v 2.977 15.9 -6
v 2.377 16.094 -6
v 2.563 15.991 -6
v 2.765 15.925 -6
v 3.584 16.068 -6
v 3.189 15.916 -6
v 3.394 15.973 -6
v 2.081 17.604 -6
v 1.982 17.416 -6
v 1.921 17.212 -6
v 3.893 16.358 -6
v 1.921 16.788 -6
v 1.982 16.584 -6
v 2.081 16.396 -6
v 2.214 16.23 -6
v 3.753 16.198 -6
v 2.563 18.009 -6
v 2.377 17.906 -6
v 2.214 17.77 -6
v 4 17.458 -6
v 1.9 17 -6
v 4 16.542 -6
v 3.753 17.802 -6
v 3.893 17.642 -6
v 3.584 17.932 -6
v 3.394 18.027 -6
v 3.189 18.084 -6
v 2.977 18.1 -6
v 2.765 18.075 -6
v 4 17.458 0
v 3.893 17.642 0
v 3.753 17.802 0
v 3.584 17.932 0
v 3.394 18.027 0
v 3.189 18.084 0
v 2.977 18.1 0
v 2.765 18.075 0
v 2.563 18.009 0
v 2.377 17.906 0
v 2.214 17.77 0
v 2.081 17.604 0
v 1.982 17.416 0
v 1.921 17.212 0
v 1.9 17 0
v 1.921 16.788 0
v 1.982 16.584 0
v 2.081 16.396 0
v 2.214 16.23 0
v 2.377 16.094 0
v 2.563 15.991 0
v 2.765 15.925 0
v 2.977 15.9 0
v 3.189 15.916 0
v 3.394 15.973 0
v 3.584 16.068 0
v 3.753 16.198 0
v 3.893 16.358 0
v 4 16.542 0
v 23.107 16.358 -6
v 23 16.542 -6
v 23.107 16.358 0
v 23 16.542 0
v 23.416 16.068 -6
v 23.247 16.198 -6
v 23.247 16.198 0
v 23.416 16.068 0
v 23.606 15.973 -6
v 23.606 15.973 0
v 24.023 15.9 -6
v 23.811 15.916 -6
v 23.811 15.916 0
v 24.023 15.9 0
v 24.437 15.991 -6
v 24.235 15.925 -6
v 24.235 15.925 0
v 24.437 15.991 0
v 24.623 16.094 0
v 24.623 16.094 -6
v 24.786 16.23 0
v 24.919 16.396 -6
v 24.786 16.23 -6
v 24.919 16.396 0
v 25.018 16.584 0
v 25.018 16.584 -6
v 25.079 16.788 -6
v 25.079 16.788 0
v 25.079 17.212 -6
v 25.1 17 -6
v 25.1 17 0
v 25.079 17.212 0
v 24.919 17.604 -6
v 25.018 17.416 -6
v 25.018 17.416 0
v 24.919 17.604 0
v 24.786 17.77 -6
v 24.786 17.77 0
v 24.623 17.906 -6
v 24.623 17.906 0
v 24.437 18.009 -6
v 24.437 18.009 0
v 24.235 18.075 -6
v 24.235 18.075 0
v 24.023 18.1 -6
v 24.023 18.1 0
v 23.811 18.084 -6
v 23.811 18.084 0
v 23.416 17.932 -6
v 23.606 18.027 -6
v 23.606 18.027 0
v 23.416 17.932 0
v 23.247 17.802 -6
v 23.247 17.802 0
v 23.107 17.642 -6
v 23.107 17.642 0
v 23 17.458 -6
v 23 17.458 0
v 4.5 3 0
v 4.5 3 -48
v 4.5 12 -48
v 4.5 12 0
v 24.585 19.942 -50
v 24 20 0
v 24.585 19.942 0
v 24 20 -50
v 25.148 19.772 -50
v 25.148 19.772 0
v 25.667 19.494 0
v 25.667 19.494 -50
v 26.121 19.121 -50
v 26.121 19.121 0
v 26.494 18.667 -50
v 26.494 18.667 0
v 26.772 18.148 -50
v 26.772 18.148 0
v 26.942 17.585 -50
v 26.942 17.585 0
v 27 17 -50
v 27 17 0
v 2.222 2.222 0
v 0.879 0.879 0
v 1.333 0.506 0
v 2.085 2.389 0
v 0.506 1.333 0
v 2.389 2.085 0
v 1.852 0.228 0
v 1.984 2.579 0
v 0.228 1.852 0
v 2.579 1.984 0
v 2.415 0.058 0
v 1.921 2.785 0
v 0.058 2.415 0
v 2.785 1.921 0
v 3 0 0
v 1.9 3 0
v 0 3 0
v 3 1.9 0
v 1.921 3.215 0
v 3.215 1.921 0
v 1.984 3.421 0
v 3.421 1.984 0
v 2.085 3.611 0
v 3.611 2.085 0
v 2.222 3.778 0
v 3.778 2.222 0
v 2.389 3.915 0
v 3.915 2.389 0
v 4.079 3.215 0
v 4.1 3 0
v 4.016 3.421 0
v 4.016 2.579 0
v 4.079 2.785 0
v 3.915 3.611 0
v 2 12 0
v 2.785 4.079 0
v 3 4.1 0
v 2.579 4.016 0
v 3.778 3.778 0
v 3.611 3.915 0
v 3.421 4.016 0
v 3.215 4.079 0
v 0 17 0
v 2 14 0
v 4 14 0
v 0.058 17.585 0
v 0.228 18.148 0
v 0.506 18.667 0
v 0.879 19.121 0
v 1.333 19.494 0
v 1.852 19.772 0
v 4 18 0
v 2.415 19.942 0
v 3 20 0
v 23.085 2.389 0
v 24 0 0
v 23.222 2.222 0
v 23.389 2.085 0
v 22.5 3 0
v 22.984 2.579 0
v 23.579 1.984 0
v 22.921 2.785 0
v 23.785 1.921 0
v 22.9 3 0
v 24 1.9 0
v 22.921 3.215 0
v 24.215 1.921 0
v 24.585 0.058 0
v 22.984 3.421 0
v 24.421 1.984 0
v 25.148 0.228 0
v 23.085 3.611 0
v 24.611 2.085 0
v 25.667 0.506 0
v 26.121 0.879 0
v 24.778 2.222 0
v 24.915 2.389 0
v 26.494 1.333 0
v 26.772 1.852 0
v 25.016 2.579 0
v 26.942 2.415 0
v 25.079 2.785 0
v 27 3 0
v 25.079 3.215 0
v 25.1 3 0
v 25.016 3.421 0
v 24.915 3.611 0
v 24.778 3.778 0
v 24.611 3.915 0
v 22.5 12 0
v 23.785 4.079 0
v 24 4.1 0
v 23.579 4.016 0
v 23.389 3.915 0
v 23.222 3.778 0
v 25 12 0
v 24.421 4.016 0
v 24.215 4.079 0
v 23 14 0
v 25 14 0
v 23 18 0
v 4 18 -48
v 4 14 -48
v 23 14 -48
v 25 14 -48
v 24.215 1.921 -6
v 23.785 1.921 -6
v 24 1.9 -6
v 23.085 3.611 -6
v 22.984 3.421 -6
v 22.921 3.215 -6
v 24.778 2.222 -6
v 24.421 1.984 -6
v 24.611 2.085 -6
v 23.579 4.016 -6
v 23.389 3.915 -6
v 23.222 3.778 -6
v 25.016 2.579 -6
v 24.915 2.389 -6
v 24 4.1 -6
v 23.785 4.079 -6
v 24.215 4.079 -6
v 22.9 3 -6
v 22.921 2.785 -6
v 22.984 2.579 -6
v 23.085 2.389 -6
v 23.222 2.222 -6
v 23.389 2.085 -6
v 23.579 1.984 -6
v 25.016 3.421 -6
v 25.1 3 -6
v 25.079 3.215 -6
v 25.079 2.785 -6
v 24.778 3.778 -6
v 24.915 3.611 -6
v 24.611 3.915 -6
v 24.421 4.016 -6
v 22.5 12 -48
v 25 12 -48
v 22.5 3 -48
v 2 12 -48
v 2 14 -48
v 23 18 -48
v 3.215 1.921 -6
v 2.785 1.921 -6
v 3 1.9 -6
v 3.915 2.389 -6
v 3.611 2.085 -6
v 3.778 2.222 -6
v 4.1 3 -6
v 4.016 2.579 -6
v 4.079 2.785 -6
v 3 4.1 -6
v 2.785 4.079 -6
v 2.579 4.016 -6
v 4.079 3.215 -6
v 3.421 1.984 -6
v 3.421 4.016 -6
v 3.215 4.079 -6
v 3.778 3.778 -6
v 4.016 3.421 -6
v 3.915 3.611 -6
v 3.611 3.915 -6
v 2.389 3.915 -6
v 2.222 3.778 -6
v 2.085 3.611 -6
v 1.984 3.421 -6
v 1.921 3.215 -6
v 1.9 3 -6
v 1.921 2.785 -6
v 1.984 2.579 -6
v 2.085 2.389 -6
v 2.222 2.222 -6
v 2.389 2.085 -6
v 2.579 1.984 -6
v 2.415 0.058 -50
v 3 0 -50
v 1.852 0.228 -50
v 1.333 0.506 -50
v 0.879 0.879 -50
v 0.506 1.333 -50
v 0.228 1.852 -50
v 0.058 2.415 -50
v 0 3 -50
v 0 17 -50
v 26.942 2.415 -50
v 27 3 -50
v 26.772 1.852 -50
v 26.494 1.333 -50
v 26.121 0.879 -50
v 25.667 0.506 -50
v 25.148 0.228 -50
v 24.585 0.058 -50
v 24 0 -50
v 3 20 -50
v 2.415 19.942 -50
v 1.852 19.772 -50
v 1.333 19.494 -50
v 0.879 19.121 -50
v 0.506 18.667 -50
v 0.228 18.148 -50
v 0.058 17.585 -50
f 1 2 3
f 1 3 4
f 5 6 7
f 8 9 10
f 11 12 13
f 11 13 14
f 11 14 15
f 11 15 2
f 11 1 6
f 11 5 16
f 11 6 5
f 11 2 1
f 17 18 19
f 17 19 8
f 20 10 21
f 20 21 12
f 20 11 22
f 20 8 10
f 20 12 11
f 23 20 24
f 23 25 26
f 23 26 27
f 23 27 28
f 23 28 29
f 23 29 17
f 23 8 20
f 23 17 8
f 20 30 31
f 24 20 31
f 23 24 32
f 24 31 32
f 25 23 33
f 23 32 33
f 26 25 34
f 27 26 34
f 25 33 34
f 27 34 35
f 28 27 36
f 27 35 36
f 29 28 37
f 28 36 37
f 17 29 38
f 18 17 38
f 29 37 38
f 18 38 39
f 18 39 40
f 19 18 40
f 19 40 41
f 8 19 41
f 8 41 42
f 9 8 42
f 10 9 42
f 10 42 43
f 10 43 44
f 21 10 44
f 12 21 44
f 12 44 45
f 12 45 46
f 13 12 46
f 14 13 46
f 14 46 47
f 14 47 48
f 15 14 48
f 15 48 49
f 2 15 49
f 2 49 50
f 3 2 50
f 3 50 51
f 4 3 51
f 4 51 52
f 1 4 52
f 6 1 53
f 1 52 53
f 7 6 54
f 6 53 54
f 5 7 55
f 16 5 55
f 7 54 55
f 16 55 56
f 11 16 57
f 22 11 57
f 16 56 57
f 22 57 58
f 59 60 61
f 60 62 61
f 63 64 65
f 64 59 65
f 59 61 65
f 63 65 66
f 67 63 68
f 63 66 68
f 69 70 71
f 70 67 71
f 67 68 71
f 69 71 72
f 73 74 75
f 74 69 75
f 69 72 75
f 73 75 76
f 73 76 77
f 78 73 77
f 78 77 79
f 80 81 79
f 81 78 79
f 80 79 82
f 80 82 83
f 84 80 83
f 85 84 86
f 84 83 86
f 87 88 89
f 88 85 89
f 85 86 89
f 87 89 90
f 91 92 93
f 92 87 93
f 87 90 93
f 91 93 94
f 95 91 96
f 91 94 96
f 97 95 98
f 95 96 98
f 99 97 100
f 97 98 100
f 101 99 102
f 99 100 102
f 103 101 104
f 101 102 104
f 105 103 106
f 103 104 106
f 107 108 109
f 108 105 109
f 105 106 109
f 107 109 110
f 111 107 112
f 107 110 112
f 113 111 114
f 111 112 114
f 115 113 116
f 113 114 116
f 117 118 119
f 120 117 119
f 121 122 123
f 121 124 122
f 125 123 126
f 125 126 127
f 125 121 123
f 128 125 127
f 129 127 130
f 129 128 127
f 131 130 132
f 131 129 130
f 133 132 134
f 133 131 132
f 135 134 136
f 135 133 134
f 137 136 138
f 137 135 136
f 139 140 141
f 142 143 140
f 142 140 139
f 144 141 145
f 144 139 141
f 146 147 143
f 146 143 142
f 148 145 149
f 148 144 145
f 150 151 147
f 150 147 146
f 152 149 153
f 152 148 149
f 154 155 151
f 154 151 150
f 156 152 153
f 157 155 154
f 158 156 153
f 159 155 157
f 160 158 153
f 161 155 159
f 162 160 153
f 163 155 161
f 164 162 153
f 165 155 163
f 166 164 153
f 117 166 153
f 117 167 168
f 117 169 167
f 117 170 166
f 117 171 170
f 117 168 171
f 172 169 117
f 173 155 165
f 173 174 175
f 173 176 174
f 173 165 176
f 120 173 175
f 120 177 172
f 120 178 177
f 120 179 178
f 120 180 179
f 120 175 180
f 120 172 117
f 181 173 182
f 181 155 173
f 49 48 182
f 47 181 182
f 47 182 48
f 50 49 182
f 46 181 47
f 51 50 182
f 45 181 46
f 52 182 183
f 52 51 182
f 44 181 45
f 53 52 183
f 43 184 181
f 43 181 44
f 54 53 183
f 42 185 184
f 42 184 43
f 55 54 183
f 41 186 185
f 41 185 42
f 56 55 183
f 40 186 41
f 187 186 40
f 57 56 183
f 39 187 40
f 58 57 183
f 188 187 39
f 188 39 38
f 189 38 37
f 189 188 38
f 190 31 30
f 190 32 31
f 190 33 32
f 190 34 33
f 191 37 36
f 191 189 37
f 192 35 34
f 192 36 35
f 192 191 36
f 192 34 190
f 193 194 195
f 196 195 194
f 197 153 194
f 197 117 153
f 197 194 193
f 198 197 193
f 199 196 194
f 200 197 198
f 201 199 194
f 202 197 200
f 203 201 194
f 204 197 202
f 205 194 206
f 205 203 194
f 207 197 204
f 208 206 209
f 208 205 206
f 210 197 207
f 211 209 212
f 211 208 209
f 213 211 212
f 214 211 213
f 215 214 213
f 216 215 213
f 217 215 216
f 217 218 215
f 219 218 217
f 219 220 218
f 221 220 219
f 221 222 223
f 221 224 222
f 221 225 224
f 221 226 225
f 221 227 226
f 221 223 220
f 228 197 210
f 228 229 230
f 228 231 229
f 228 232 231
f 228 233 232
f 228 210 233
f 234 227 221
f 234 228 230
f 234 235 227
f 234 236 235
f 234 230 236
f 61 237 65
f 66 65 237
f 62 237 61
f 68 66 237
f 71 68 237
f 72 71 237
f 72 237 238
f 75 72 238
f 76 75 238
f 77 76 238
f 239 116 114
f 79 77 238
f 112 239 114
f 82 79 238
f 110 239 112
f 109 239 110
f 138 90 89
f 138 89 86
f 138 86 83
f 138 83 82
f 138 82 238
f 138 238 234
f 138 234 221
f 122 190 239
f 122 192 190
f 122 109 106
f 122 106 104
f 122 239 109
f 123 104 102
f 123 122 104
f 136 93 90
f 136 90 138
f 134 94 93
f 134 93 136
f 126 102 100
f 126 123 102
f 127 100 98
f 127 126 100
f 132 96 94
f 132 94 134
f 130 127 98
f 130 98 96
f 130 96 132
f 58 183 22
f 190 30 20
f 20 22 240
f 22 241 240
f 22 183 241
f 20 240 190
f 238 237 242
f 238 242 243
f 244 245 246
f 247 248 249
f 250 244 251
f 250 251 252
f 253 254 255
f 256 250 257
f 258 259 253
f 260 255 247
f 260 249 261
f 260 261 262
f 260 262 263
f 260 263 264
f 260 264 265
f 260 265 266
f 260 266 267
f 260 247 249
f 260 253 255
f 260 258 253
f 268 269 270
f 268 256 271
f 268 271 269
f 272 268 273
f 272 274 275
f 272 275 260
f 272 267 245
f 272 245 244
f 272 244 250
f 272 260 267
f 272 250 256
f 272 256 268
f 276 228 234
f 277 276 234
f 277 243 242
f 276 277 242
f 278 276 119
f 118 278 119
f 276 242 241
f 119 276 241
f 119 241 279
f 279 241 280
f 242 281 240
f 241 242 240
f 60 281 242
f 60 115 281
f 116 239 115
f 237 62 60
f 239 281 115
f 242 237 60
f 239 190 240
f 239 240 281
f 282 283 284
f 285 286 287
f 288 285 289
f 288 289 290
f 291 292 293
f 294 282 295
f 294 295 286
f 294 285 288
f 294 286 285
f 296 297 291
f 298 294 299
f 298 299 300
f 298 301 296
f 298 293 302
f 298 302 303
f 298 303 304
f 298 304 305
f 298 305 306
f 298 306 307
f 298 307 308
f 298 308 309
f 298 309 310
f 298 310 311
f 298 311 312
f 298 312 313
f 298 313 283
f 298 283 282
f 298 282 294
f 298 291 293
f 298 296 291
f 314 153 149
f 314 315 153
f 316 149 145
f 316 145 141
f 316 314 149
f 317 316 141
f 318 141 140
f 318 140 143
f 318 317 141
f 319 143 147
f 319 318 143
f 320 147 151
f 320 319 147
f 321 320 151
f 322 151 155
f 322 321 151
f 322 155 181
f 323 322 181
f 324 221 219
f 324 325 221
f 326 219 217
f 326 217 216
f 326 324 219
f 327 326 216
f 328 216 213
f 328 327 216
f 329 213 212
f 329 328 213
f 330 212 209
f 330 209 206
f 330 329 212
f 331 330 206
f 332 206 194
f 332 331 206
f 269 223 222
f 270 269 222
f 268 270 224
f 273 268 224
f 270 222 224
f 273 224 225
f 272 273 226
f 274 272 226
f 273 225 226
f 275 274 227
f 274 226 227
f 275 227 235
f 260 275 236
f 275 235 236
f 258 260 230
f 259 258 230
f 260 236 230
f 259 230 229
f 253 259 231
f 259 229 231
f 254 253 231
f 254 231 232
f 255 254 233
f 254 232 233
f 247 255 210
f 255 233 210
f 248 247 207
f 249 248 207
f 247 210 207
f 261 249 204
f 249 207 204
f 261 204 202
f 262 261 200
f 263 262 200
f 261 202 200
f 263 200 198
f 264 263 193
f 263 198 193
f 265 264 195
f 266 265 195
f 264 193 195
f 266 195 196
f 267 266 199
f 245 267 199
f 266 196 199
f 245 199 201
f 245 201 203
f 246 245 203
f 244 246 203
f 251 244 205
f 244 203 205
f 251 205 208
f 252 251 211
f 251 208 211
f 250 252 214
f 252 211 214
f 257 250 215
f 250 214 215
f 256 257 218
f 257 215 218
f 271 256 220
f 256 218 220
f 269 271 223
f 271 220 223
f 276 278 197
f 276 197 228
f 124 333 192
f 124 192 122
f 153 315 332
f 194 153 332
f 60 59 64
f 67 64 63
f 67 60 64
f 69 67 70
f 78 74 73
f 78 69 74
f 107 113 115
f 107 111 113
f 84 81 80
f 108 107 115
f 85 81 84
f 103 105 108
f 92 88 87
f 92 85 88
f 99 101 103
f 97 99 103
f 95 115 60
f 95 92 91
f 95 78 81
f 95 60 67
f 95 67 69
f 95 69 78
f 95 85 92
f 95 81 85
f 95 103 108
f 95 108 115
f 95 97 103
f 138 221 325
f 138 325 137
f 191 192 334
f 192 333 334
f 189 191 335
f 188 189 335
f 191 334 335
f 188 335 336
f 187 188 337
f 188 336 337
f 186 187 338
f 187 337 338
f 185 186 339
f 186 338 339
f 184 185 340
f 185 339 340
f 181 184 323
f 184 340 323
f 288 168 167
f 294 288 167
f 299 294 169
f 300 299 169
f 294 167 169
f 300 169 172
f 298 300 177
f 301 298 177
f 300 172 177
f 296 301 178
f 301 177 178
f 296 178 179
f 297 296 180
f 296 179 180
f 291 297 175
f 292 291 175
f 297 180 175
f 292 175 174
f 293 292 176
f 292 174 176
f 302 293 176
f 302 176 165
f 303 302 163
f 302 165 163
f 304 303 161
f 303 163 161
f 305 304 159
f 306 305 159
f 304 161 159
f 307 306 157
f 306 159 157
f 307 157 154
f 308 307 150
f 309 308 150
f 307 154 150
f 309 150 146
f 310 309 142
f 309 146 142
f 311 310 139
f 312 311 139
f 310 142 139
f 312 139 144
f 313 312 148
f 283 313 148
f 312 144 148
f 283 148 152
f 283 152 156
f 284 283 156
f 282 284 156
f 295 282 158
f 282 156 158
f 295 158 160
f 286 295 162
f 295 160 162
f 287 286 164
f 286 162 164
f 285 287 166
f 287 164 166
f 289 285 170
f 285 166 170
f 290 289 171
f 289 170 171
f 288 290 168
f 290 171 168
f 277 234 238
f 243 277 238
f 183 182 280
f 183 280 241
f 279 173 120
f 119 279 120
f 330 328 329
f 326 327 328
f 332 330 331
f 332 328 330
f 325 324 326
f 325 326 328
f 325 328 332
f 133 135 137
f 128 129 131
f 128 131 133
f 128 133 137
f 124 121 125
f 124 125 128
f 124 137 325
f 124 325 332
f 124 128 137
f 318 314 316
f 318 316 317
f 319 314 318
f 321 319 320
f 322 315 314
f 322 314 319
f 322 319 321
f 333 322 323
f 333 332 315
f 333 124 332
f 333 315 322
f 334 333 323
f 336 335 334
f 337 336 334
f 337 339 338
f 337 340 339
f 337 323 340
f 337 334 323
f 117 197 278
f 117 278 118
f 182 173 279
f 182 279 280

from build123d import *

# Parameters (mm, degrees)
SKETCH1_W               = 27
SKETCH1_H               = 20
BOSS_EXTRUDE1_DEPTH     = 50
SKETCH2_W               = 19
SKETCH2_H               = 14
BOSS_EXTRUDE2_DEPTH     = 2
SKETCH3_W               = 23
SKETCH3_H               = 2
CUT_EXTRUDE1_DEPTH      = 48
SKETCH4_W               = 0.5
SKETCH4_H               = 9
SKETCH4_W_2             = 19
SKETCH4_H_2             = 0.5
BOSS_EXTRUDE3_DEPTH     = 48
FILLET1_R               = 3
SKETCH6_R               = 1.1
CUT_EXTRUDE2_DEPTH      = 6
CUT_EXTRUDE3_DEPTH      = 61.241181927
CUT_EXTRUDE3_DEPTH_BACK = 48
SKETCH14_W              = 19
SKETCH14_H              = 1.5


with BuildPart() as part:
    # Sketch1 → Boss-Extrude1 (new body)
    with BuildSketch(Plane.XY):
        with Locations((13.5, 10)):
            Rectangle(SKETCH1_W, SKETCH1_H)
        Polygon((4, 17), (23, 17), (23, 16), (23, 4), (23, 3), (4, 3), (4, 4), (4, 16), align=None, mode=Mode.SUBTRACT)
    extrude(amount=-BOSS_EXTRUDE1_DEPTH)

    # Sketch2 → Boss-Extrude2 (add)
    with BuildSketch(Plane(origin=(0, 0, -50), x_dir=(-1, 0, 0), z_dir=(0, 0, -1))):
        with Locations((-13.5, 10)):
            Rectangle(SKETCH2_W, SKETCH2_H)
    extrude(amount=-BOSS_EXTRUDE2_DEPTH)

    # Sketch3 → Cut-Extrude1 (cut)
    with BuildSketch(Plane.XY):
        with Locations((13.5, 13)):
            Rectangle(SKETCH3_W, SKETCH3_H)
    extrude(amount=-CUT_EXTRUDE1_DEPTH, mode=Mode.SUBTRACT)

    # Sketch4 → Boss-Extrude3 (add)
    with BuildSketch(Plane.XY):
        with Locations((4.25, 7.5)):
            Rectangle(SKETCH4_W, SKETCH4_H)
        with Locations((22.75, 7.5)):
            Rectangle(SKETCH4_W, SKETCH4_H)
        with Locations((13.5, 16.75)):
            Rectangle(SKETCH4_W_2, SKETCH4_H_2)
    extrude(amount=-BOSS_EXTRUDE3_DEPTH)

    # Fillet1
    fillet1_edges = [part.edges().sort_by_distance(p)[0] for p in [
        (0, 0, -25),
        (0, 20, -25),
        (27, 20, -25),
        (27, 0, -25),
    ]]
    fillet(fillet1_edges, radius=FILLET1_R)

    # Sketch6 → Cut-Extrude2 (cut)
    with BuildSketch(Plane.XY):
        with Locations((3, 17)):
            Circle(SKETCH6_R)
        with Locations((24, 17)):
            Circle(SKETCH6_R)
        with Locations((24, 3)):
            Circle(SKETCH6_R)
        with Locations((3, 3)):
            Circle(SKETCH6_R)
    extrude(amount=-CUT_EXTRUDE2_DEPTH, mode=Mode.SUBTRACT)

    # Sketch14 → Cut-Extrude3 (cut, two sides: drawn at the far end of the back side and taken through both)
    with BuildSketch(Plane.XY.offset(-CUT_EXTRUDE3_DEPTH_BACK)):
        with Locations((13.5, 17.25)):
            Rectangle(SKETCH14_W, SKETCH14_H)
    extrude(amount=CUT_EXTRUDE3_DEPTH + CUT_EXTRUDE3_DEPTH_BACK, mode=Mode.SUBTRACT)


solid = part.part
